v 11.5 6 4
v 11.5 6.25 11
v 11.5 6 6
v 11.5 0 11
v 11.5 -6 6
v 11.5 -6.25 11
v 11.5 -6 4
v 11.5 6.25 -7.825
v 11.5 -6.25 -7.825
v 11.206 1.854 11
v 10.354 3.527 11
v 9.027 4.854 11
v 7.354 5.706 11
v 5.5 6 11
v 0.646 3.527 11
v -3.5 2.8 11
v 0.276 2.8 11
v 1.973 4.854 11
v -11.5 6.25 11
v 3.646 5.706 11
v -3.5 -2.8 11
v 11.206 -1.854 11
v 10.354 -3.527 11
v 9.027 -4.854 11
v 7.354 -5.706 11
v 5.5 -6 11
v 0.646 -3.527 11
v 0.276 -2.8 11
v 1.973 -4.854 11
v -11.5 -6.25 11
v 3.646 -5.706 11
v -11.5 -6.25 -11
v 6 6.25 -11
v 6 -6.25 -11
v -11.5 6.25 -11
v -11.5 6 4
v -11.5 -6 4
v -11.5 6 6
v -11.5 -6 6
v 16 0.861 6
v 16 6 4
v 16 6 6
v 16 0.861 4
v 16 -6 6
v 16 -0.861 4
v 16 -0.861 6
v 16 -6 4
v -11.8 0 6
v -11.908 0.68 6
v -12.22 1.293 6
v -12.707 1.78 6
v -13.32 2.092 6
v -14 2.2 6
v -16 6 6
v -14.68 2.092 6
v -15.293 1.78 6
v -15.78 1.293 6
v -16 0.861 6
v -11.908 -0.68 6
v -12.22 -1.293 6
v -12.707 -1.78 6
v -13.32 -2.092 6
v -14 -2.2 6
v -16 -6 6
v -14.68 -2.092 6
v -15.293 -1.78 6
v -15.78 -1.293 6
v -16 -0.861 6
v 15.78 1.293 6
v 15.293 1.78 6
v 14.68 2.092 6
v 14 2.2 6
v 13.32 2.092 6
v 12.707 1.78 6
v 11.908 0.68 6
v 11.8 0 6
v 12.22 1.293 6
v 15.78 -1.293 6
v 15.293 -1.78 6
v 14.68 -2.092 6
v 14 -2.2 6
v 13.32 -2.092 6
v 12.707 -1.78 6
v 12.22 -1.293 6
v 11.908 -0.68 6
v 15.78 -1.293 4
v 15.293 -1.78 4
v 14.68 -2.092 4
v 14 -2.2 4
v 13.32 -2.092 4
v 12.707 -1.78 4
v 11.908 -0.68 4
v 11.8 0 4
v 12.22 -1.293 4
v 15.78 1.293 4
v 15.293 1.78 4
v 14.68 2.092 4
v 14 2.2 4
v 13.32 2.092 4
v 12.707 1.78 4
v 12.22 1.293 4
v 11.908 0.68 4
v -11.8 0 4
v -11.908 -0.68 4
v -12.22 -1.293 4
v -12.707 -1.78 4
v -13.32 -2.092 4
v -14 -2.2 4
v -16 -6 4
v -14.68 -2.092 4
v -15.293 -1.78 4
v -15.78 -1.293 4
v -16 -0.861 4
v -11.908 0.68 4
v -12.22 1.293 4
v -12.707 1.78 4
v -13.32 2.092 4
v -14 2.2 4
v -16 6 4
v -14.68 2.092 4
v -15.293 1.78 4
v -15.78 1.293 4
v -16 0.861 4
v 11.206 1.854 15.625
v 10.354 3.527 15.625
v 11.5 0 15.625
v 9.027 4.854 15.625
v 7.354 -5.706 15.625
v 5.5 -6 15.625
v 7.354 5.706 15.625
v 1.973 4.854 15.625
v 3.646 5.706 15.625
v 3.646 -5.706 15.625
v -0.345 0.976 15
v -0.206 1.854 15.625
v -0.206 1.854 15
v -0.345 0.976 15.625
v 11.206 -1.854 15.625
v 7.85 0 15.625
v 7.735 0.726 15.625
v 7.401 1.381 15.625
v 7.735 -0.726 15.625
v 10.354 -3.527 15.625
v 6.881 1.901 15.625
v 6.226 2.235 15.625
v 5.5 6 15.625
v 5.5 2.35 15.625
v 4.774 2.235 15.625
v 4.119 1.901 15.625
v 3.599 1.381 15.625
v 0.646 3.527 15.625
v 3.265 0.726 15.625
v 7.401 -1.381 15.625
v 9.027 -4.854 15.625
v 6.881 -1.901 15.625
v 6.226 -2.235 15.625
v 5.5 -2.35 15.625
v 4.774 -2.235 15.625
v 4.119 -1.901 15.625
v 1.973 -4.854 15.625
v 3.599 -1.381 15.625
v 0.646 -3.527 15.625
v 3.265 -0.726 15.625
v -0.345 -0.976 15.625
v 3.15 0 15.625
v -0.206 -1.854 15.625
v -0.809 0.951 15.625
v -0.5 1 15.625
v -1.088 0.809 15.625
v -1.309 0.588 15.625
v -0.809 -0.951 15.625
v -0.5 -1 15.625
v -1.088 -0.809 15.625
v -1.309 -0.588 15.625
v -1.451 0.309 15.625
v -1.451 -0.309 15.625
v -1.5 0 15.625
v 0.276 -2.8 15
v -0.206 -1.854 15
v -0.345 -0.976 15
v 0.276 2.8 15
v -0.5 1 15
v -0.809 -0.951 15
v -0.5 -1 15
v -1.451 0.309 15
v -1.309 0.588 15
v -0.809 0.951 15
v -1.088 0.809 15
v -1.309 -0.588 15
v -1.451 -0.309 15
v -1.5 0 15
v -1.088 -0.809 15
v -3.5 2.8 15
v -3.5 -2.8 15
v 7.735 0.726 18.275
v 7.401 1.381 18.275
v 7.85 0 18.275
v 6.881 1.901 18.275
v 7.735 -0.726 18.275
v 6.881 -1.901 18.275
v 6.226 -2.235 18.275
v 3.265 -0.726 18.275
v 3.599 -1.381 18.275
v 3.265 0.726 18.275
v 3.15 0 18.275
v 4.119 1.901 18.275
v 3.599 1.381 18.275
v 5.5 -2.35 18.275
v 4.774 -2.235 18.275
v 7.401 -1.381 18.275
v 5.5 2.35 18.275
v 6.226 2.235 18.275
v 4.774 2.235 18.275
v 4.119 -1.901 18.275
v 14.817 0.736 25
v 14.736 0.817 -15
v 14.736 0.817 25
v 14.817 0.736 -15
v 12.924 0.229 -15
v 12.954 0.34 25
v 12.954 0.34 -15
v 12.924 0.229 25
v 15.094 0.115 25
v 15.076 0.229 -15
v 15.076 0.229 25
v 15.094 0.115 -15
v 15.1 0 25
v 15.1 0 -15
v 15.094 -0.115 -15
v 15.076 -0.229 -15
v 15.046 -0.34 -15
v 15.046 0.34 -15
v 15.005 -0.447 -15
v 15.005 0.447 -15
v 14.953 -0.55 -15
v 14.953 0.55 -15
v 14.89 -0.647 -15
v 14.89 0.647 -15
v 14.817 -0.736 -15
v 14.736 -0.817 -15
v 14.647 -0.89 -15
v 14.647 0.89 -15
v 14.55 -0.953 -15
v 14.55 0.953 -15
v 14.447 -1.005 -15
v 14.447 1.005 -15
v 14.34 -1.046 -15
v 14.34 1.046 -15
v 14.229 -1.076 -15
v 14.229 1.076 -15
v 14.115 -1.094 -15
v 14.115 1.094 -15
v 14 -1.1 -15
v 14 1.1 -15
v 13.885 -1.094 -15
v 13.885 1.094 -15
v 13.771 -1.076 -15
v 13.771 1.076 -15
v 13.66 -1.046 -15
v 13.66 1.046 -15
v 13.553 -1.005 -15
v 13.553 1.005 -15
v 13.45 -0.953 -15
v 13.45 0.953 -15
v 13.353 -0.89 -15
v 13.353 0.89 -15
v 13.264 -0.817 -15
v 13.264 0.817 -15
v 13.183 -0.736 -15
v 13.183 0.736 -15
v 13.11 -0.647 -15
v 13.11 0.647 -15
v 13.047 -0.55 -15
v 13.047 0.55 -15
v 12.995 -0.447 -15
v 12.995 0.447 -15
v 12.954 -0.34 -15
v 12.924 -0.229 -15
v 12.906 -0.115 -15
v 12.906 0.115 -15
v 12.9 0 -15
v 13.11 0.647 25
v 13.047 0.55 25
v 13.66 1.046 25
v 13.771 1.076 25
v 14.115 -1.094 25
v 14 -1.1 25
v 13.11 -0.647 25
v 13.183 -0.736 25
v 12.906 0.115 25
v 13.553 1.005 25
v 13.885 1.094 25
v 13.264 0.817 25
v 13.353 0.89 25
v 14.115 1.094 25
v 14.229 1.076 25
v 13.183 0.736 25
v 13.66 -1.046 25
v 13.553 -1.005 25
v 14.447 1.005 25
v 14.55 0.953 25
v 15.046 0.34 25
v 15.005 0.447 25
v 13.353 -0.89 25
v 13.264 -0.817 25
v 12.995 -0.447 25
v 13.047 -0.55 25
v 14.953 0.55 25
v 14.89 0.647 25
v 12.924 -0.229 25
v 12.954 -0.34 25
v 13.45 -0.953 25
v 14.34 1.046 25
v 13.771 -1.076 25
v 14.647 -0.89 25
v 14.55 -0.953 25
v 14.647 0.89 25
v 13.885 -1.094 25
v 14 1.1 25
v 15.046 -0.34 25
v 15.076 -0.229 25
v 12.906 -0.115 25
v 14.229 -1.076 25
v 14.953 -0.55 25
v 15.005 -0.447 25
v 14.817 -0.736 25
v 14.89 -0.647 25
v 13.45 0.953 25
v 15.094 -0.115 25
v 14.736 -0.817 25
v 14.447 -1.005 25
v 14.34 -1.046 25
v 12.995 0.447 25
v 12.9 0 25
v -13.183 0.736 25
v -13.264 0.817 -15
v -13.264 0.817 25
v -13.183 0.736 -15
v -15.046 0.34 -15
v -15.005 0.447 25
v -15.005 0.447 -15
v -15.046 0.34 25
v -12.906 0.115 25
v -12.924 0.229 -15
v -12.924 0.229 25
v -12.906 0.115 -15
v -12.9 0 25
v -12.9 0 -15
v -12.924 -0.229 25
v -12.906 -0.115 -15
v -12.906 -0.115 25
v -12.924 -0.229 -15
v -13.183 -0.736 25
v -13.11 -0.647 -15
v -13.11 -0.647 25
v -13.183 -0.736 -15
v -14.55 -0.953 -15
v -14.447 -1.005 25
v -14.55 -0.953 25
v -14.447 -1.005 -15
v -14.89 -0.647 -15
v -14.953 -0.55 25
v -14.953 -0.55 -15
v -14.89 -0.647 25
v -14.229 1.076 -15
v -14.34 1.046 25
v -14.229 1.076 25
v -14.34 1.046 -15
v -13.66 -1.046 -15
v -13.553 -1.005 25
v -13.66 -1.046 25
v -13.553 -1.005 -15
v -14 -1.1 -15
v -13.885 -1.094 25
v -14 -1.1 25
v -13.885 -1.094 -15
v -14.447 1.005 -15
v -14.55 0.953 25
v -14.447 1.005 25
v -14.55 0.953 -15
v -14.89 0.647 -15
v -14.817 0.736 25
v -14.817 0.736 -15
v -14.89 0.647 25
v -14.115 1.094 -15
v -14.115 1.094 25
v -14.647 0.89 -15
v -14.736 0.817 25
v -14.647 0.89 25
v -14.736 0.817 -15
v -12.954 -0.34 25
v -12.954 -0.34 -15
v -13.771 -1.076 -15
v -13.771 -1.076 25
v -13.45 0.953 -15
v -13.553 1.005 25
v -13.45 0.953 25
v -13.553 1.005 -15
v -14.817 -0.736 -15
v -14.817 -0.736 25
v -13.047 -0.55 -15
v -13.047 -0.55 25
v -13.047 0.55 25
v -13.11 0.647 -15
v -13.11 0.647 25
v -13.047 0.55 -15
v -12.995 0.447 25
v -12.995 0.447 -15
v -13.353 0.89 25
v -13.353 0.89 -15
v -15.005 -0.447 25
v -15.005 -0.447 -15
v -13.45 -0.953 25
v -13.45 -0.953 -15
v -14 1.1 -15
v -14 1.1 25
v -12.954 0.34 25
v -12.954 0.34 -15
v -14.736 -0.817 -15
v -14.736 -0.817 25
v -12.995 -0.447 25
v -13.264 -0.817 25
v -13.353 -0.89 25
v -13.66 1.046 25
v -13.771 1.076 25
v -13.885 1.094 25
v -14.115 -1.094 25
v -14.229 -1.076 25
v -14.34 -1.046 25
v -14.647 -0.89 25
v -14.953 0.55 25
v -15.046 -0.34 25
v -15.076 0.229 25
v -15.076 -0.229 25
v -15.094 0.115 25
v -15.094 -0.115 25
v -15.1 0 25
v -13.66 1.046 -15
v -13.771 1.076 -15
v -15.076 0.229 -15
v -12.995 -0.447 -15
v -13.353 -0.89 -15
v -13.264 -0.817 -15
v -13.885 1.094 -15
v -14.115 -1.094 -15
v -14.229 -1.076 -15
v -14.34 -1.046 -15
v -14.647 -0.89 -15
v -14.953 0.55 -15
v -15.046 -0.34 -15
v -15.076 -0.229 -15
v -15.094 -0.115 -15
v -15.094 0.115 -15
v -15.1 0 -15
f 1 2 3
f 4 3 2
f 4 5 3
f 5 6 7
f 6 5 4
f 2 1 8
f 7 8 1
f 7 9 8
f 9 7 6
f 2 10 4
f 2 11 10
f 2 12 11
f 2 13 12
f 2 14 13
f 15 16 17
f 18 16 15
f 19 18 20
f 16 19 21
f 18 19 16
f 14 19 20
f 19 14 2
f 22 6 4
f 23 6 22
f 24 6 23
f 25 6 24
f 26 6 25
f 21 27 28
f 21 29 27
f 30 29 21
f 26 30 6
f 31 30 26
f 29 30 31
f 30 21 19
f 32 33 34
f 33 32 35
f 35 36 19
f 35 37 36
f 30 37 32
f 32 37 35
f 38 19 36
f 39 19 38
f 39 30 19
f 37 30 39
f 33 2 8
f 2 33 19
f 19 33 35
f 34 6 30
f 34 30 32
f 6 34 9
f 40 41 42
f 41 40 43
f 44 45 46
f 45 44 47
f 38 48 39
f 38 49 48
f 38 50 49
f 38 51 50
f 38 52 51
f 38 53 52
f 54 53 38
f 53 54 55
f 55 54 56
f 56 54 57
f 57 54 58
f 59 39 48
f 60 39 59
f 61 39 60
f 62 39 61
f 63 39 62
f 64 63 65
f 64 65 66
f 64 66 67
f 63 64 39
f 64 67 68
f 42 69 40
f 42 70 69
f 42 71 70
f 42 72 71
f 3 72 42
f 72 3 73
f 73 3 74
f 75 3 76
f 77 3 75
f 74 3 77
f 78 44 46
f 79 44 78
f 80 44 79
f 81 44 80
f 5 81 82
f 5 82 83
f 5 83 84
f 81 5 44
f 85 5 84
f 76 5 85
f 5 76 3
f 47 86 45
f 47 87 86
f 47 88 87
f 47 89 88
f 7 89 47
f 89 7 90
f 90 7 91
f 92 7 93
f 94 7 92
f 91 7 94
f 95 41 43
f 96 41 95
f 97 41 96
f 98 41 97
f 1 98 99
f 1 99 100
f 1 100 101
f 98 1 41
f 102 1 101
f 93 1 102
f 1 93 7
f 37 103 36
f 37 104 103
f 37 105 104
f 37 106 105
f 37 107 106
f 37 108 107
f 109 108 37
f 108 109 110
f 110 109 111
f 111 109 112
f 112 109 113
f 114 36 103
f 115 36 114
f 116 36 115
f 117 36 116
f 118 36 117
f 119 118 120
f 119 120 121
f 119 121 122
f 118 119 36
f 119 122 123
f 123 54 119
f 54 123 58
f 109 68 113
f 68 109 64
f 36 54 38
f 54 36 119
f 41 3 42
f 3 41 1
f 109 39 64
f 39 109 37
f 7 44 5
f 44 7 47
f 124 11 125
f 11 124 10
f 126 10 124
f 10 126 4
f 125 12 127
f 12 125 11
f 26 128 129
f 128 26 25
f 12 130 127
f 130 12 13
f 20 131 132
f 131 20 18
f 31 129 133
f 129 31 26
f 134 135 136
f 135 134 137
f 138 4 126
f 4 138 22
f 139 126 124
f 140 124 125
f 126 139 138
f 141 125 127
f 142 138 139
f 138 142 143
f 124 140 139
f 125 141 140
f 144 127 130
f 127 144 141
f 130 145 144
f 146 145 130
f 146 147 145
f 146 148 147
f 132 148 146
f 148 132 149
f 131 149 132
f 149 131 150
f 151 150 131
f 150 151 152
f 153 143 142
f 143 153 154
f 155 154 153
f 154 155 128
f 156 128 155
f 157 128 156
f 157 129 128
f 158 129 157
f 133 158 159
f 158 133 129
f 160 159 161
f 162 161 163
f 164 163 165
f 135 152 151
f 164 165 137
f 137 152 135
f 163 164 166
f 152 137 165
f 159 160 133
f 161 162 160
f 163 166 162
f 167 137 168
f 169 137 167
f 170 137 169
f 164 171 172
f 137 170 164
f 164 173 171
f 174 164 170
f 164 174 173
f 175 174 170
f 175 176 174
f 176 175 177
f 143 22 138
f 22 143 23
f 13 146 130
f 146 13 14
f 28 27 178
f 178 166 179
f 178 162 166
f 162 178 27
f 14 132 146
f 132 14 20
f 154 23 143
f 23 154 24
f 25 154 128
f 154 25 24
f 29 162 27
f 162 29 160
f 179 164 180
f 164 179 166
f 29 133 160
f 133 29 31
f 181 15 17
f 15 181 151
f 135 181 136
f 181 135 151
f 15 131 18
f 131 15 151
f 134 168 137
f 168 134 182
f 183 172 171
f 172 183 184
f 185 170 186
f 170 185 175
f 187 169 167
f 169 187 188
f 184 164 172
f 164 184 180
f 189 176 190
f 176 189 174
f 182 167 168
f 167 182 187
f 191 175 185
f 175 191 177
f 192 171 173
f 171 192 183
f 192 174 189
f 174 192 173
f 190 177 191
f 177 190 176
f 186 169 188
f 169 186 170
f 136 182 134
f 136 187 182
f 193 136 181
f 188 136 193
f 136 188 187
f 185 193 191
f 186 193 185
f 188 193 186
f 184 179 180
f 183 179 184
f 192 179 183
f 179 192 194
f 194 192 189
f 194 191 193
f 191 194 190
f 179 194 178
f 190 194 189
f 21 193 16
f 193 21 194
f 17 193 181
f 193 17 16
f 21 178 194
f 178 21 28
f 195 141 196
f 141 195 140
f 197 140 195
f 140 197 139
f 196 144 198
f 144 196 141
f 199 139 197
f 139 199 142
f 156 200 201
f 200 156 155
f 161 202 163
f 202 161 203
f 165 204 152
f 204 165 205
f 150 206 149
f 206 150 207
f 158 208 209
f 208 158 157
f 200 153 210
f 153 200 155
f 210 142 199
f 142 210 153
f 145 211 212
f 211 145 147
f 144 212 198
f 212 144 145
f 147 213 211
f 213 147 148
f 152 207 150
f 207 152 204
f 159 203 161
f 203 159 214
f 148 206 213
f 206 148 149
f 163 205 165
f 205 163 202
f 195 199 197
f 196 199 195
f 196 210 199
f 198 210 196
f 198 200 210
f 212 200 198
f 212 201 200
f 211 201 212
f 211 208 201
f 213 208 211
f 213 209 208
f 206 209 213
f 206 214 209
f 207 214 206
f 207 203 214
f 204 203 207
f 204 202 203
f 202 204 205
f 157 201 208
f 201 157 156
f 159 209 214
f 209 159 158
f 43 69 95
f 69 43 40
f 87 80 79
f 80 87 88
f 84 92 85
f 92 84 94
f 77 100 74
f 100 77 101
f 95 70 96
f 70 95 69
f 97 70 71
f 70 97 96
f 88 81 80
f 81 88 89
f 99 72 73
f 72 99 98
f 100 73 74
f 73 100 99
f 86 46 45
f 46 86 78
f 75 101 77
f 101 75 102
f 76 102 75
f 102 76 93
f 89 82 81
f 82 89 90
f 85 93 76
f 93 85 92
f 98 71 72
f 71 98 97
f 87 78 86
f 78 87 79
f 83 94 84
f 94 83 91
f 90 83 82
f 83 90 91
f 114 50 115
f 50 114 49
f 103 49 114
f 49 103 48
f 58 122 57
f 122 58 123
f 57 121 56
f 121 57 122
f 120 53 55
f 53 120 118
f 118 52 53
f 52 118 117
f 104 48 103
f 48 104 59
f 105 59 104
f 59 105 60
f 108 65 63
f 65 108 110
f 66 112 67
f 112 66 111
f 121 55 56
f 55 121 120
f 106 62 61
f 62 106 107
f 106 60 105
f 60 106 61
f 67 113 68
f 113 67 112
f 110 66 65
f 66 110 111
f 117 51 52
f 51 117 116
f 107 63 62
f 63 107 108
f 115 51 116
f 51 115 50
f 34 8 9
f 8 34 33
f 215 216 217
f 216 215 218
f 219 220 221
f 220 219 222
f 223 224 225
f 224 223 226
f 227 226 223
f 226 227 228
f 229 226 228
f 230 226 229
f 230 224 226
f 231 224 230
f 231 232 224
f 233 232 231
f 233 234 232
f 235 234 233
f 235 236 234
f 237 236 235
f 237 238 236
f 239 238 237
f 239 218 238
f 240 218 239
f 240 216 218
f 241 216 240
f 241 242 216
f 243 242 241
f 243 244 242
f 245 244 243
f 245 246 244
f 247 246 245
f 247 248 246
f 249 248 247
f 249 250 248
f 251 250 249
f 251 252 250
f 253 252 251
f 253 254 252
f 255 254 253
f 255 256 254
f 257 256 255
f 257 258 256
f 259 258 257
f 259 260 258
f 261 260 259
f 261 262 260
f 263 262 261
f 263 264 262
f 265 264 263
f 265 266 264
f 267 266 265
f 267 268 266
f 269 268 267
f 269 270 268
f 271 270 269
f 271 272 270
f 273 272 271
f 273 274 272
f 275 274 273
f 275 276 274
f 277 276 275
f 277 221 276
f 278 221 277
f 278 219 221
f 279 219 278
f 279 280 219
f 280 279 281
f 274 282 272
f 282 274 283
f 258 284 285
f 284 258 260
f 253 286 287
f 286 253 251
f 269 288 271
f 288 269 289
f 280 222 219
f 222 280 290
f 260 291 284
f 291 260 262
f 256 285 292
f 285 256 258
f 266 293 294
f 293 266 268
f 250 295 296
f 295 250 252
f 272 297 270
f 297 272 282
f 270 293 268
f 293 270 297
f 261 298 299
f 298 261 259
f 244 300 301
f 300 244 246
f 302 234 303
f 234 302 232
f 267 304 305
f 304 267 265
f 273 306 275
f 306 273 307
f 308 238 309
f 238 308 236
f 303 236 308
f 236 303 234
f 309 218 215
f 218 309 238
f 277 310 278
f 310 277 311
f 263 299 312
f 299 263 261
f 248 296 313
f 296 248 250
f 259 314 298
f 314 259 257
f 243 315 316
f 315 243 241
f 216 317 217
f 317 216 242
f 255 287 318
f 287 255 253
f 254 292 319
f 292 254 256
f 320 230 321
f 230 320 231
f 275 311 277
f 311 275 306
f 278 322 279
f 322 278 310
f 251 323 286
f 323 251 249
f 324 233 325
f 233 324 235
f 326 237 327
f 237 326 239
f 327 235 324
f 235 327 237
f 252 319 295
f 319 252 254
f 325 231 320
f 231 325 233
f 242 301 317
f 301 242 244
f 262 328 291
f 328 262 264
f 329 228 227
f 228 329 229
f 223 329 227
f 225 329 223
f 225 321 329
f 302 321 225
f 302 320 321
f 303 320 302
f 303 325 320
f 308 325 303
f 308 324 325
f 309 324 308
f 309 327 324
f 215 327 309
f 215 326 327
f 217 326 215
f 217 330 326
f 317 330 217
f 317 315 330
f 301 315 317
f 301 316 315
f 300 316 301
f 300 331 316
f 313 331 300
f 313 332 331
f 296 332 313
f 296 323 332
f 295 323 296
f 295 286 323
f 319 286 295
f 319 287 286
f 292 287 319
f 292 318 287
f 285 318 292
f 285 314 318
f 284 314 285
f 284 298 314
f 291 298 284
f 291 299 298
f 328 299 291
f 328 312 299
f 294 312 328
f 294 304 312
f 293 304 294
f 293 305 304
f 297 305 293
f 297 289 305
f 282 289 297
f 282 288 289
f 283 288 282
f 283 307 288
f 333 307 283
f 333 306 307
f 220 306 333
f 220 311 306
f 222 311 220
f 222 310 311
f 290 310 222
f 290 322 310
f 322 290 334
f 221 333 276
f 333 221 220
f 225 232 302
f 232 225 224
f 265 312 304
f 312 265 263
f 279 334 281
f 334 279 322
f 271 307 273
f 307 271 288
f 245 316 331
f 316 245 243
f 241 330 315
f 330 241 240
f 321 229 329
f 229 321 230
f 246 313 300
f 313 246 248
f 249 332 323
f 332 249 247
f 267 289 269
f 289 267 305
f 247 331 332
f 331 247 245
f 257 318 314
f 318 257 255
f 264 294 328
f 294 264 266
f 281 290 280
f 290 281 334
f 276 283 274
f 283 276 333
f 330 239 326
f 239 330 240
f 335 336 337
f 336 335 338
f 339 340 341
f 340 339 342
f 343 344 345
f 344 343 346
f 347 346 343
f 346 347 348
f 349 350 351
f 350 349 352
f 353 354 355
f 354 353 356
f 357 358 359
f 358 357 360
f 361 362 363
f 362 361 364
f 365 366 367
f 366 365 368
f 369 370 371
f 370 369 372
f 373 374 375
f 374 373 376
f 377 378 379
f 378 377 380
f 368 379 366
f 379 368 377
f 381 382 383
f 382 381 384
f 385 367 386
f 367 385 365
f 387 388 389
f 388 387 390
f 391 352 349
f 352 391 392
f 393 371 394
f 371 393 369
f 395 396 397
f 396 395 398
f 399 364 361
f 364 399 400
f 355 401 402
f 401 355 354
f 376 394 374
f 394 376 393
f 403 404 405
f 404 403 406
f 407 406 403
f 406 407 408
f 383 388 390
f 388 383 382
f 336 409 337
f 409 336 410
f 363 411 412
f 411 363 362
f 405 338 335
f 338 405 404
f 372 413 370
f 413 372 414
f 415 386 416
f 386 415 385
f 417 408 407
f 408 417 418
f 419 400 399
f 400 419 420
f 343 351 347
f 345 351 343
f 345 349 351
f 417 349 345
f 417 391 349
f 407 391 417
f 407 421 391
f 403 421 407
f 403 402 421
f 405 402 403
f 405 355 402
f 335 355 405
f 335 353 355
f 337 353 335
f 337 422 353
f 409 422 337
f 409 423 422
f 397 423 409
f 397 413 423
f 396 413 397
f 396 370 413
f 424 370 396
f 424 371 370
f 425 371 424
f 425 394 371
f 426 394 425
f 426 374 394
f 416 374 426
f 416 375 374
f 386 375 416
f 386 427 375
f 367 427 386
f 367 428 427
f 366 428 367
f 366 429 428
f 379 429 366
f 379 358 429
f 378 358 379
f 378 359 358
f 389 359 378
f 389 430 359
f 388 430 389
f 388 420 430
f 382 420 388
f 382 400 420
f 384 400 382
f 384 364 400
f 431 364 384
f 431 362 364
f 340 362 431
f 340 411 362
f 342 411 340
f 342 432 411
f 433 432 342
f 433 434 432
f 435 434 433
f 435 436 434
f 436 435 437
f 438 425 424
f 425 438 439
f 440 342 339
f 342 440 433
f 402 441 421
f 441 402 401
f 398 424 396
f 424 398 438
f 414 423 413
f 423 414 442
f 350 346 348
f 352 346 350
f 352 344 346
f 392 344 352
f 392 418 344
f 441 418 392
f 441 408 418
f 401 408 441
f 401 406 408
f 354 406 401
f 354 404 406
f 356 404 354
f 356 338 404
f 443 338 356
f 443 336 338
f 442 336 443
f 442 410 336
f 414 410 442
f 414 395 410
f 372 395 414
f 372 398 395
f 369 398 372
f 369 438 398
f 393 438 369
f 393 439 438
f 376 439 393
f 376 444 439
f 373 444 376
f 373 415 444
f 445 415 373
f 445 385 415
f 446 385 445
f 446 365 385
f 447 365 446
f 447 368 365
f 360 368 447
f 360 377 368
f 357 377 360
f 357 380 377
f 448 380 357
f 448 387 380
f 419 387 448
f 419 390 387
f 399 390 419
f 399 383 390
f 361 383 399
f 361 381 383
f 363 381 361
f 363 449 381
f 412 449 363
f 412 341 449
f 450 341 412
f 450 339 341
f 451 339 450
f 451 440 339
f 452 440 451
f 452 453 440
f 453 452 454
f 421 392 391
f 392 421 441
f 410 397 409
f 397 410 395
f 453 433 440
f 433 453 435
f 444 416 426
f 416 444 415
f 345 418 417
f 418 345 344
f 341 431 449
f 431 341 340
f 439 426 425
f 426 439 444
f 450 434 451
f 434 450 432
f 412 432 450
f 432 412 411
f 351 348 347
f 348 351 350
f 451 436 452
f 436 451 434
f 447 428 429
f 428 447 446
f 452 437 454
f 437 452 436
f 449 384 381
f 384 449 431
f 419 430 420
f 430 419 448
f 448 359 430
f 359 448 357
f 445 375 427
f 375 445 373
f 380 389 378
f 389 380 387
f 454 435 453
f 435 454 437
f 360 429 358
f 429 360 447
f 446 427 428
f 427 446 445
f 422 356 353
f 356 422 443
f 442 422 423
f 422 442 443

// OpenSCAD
$fn=60;
sg90_motor();

module sg90_motor(){
	difference(){			
		union(){
			color("green") cube([23,12.5,22], center=true);
			color("blue") translate([0,0,5]) cube([32,12,2], center=true);
			color("blue") translate([5.5,0,2.75]) cylinder(r=6, h=25.75, $fn=20, center=true);
			color("blue") translate([-.5,0,2.75]) cylinder(r=1, h=25.75, $fn=20, center=true);
			color("blue") translate([-1,0,2.75]) cube([5,5.6,24.5], center=true);		
			color("white") translate([5.5,0,3.65]) cylinder(r=2.35, h=29.25, $fn=20, center=true);				
		} // of union()
		translate([10,0,-11]) rotate([0,-30,0]) cube([8,13,4], center=true);
		for ( hole = [14,-14] ){
			translate([hole,0,5]) cylinder(r=2.2, h=4, $fn=20, center=true);
		}	// of for loop
	} // of difference()
    translate([14,0,5])  cylinder(d=2.2,h=40, center=true,$fn=60);
    translate([-14,0,5]) cylinder(d=2.2,h=40, center=true,$fn=60);
} // of module()
